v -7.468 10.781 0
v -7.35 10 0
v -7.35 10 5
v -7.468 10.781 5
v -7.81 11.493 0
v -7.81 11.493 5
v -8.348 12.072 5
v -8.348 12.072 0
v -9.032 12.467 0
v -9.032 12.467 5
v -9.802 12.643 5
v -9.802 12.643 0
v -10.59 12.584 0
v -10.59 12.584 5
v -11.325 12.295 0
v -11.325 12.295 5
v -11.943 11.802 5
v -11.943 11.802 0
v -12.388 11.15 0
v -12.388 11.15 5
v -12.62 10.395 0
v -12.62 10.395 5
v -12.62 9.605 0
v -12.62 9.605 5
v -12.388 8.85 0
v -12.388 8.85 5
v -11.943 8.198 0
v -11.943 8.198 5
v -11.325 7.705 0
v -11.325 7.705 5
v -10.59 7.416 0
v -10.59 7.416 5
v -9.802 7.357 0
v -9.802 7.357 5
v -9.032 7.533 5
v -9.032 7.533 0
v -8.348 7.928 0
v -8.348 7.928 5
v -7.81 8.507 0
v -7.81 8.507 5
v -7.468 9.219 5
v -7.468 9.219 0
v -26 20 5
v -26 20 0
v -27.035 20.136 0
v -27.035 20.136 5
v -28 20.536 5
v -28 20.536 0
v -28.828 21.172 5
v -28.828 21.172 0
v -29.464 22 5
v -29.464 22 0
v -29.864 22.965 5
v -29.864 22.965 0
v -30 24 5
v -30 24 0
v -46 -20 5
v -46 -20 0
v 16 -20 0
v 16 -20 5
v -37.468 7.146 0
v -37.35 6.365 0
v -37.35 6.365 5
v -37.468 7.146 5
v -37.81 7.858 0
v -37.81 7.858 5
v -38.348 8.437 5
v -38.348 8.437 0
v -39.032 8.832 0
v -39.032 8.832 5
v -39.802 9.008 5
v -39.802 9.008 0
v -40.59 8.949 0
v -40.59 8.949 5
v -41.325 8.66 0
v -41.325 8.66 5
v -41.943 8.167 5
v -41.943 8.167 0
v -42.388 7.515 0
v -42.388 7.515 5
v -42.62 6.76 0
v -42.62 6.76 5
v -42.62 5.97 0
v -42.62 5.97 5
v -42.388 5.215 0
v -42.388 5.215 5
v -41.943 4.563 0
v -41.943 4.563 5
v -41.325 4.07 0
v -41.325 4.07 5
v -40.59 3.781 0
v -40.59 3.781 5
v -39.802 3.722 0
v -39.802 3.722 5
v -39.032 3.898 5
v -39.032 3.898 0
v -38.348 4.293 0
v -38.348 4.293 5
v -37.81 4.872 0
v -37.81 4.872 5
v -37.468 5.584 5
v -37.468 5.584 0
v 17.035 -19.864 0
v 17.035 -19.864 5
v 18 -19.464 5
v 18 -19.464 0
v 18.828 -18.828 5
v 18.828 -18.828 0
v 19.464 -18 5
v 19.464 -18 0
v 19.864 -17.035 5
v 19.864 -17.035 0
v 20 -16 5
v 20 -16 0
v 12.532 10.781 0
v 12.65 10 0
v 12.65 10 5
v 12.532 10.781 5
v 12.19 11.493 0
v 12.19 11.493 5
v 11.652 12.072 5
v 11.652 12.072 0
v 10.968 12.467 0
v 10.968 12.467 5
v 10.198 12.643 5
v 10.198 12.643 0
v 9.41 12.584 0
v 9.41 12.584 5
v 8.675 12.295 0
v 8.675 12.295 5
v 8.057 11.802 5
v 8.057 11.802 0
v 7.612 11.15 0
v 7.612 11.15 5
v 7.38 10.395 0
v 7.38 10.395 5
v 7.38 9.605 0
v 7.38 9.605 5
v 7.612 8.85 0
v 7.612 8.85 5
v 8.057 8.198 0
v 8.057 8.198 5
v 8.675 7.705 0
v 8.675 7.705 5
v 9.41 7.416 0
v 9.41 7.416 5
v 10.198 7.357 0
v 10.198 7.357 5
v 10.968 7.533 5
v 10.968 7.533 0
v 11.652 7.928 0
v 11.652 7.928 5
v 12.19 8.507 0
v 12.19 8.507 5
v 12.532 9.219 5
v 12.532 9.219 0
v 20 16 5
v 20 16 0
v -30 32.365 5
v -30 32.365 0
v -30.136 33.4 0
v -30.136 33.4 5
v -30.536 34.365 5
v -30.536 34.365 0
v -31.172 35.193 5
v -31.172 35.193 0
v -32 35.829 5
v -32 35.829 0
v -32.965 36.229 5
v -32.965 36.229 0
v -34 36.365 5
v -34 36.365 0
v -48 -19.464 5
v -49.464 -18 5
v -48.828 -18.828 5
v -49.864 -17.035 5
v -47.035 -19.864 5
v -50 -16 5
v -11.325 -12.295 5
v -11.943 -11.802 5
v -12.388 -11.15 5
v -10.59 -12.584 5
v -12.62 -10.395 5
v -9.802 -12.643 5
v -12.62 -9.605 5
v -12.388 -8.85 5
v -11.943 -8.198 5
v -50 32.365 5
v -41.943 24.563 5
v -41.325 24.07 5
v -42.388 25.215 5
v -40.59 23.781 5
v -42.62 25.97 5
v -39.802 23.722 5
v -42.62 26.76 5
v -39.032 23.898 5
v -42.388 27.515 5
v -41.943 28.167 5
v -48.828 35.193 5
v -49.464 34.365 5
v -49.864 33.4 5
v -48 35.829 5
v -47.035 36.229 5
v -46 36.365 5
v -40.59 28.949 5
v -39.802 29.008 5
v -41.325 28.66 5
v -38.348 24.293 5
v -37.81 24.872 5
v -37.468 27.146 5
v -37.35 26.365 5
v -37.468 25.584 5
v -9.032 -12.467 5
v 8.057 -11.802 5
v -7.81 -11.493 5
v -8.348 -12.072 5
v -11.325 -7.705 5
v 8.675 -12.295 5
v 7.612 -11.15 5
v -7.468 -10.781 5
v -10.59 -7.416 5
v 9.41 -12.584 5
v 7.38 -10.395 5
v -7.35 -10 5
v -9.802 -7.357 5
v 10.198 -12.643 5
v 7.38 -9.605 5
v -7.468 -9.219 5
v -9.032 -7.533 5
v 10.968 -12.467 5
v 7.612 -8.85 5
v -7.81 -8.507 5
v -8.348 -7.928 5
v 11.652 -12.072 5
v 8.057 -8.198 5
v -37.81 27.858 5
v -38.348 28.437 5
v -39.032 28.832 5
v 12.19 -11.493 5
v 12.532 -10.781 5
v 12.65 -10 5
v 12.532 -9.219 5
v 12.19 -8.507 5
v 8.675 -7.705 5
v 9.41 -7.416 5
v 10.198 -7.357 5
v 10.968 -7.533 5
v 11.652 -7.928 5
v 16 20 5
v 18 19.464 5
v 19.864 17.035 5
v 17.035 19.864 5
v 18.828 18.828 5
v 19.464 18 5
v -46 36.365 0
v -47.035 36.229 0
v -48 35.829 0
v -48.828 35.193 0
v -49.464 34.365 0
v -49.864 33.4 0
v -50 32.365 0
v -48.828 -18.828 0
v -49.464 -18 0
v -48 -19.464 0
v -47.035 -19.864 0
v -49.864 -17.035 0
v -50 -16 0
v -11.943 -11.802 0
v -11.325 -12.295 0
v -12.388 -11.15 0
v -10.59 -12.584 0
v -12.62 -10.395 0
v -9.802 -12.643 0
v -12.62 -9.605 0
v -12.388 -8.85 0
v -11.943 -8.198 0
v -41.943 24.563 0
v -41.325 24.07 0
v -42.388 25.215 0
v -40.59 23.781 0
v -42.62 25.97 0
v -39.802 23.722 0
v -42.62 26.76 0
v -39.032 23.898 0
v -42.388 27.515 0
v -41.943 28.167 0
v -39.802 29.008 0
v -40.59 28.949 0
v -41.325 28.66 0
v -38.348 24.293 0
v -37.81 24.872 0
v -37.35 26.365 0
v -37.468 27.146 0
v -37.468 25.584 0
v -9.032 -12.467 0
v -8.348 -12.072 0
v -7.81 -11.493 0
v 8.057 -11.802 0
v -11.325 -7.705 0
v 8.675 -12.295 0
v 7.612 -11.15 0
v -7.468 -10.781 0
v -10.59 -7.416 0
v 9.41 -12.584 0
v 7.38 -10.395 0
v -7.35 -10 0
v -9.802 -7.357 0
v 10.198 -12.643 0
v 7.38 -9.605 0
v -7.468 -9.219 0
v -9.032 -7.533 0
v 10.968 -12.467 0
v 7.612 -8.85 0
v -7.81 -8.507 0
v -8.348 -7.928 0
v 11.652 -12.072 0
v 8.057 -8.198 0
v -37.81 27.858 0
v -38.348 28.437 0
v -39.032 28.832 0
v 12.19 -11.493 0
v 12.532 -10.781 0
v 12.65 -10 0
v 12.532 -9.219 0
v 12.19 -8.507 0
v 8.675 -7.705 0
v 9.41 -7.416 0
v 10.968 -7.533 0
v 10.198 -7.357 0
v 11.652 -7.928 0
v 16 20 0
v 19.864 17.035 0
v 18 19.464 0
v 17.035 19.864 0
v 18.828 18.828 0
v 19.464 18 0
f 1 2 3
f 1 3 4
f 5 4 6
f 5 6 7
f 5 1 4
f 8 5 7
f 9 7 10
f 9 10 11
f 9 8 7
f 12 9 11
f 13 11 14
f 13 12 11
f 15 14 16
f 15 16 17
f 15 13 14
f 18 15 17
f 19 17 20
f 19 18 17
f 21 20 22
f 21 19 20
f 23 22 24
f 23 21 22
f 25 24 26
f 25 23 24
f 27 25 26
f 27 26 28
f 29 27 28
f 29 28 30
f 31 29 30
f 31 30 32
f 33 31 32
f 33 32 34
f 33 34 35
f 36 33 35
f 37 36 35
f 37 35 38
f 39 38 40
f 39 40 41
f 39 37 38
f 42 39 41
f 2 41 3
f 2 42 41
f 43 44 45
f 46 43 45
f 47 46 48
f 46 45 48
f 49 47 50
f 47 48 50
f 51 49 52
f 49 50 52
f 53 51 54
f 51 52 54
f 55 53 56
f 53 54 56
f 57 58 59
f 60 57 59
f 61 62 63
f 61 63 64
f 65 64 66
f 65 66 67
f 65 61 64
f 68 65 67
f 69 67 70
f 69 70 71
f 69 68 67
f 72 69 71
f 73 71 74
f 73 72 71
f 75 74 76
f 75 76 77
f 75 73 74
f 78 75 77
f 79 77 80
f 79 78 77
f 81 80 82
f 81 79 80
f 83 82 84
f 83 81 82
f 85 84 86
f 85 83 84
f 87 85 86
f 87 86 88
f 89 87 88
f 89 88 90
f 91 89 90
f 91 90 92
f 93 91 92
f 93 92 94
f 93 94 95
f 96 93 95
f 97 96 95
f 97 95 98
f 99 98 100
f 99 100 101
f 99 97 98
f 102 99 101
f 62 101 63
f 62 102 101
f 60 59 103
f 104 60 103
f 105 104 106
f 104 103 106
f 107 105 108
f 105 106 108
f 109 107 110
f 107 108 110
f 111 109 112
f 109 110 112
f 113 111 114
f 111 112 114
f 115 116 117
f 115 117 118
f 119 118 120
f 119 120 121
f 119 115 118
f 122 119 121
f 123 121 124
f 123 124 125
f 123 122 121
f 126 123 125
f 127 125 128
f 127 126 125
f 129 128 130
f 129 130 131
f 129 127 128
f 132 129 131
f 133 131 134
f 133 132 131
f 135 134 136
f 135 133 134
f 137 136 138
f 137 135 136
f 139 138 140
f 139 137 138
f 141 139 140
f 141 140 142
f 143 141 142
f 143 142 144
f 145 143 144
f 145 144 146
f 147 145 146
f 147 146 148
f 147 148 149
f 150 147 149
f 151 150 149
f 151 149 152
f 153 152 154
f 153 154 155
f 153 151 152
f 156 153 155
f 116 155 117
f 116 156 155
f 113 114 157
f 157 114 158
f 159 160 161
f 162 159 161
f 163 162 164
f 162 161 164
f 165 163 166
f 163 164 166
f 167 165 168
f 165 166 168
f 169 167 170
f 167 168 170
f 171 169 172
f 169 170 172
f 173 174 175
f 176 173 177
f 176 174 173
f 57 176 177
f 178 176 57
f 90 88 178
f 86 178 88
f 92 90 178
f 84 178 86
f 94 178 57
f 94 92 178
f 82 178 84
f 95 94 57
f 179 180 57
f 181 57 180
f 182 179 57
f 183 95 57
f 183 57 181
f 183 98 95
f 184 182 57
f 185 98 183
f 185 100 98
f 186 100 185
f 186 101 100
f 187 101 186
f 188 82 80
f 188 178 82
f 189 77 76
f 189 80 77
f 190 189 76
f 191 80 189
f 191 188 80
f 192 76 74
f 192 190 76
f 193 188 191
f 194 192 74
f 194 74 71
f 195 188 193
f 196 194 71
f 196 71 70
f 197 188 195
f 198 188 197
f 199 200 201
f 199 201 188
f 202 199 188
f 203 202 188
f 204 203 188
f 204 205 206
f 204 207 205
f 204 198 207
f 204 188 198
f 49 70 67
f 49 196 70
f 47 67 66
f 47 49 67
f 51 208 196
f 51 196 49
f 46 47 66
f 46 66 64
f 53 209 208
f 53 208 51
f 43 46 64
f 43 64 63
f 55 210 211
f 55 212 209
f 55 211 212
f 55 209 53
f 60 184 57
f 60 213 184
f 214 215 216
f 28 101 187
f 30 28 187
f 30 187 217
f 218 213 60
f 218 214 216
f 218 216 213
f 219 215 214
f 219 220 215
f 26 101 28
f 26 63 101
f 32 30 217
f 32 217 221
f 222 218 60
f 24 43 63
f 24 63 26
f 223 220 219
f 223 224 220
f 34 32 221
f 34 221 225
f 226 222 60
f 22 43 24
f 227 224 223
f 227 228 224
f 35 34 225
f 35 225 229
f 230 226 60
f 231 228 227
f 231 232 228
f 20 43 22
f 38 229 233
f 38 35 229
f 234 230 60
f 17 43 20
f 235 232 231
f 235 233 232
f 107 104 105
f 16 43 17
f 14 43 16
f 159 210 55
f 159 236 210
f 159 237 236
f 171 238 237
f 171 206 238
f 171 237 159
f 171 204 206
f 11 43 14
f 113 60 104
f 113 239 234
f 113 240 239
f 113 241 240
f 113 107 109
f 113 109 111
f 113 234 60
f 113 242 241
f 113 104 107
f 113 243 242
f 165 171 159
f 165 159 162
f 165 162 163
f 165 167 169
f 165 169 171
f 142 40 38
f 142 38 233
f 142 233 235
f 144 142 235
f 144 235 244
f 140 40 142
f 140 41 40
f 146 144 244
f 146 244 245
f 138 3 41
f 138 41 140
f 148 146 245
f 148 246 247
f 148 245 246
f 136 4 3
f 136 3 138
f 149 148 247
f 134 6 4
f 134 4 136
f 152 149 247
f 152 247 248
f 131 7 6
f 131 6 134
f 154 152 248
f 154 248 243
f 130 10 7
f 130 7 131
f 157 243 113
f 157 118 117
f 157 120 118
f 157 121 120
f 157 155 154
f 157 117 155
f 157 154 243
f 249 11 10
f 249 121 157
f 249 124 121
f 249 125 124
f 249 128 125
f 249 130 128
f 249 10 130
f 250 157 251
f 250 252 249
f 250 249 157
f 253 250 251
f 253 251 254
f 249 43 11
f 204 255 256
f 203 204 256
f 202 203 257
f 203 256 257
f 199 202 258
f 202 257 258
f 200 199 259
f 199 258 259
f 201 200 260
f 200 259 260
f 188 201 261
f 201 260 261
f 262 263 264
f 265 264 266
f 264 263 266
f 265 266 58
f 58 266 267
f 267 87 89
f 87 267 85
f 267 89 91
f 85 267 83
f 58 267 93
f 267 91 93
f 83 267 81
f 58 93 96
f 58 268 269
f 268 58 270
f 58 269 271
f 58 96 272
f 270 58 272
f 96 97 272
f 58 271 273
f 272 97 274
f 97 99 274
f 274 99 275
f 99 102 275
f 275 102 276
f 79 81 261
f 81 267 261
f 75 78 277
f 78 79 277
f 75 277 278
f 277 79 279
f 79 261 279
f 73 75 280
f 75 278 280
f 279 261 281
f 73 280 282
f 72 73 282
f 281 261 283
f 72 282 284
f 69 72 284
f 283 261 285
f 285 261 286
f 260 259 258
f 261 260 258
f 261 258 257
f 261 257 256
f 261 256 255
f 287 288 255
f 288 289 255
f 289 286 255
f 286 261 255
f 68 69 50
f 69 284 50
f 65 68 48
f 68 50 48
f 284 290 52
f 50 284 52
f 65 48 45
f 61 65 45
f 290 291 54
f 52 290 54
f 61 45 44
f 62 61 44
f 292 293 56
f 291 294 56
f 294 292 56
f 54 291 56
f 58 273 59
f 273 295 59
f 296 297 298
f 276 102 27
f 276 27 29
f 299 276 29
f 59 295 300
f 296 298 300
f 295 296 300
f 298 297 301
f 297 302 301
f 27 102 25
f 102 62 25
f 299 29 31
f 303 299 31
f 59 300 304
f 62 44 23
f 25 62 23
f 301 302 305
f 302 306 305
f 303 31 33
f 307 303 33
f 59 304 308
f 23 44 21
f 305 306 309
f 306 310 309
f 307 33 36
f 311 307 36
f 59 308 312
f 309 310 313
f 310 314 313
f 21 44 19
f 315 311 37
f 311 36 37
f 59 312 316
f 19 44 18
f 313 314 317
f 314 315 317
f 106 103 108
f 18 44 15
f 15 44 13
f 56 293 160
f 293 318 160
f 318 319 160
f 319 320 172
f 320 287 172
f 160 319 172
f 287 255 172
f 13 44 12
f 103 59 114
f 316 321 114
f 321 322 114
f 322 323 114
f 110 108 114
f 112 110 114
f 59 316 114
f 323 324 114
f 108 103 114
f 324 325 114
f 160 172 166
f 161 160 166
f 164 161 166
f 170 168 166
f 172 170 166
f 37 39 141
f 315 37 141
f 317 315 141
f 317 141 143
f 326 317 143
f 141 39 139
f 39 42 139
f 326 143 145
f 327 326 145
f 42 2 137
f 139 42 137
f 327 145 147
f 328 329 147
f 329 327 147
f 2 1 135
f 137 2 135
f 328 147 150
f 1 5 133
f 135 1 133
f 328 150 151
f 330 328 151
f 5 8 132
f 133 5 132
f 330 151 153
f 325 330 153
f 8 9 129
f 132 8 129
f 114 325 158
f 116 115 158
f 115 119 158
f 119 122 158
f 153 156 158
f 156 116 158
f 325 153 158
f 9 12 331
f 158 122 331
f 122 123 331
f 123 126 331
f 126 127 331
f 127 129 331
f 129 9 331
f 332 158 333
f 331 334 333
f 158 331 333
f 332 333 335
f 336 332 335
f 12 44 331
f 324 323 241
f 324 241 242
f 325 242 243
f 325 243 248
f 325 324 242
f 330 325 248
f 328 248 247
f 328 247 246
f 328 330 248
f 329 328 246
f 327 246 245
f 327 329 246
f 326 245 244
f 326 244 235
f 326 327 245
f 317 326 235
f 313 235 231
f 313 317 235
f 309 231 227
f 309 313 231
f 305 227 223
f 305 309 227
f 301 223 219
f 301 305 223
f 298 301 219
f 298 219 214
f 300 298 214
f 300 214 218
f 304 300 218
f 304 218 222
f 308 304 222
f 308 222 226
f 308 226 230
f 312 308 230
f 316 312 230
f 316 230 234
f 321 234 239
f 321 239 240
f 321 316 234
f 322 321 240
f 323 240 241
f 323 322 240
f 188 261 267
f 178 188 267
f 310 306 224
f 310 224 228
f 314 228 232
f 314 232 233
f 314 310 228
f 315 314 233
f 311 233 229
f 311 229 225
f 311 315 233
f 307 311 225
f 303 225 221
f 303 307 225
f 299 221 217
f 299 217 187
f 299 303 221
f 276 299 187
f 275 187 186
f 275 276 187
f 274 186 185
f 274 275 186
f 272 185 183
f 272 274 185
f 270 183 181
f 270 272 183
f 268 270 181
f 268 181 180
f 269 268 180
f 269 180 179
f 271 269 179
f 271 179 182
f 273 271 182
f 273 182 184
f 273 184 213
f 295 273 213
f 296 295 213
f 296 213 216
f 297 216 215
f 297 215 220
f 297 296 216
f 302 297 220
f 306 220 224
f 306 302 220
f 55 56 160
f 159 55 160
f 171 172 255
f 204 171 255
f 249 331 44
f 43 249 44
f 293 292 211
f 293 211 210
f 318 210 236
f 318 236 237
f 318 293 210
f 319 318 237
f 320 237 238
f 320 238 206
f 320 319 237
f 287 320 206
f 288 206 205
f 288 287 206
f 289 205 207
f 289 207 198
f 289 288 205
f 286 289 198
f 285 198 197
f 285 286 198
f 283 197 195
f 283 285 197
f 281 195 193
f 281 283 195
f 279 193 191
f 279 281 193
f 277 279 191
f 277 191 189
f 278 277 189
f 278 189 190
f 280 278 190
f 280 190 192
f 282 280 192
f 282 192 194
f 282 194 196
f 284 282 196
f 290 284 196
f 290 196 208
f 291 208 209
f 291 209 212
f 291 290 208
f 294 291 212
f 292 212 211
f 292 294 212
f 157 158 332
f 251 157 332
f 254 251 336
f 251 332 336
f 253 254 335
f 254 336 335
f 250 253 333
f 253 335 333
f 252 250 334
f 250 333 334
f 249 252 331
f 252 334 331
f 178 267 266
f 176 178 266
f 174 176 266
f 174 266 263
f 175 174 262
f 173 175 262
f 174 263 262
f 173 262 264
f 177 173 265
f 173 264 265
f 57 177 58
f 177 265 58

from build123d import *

# Parameters (mm, degrees)
END_CAP_SKETCH_R        = 2.65
EXTRUDE_THICKNESS_DEPTH = 5


with BuildPart() as part:
    # End Cap Sketch → Extrude Thickness (new body)
    with BuildSketch(Plane.XY):
        with BuildLine():
            Line((-46, -20), (16, -20))
            ThreePointArc((16, -20), (18.828427125, -18.828427125), (20, -16))
            Line((20, -16), (20, 16))
            ThreePointArc((20, 16), (18.828427125, 18.828427125), (16, 20))
            Line((16, 20), (-26, 20))
            ThreePointArc((-26, 20), (-28.828427125, 21.171572875), (-30, 24))
            Line((-30, 24), (-30, 32.365))
            ThreePointArc((-30, 32.365), (-31.171572875, 35.193427125), (-34, 36.365))
            Line((-34, 36.365), (-46, 36.365))
            ThreePointArc((-46, 36.365), (-48.828427125, 35.193427125), (-50, 32.365))
            Line((-50, 32.365), (-50, -16))
            ThreePointArc((-50, -16), (-48.828427125, -18.828427125), (-46, -20))
        make_face()
        with Locations((-10, 10)):
            Circle(END_CAP_SKETCH_R, mode=Mode.SUBTRACT)
        with Locations((-10, -10)):
            Circle(END_CAP_SKETCH_R, mode=Mode.SUBTRACT)
        with Locations((10, 10)):
            Circle(END_CAP_SKETCH_R, mode=Mode.SUBTRACT)
        with Locations((10, -10)):
            Circle(END_CAP_SKETCH_R, mode=Mode.SUBTRACT)
        with Locations((-40, 26.365)):
            Circle(END_CAP_SKETCH_R, mode=Mode.SUBTRACT)
        with Locations((-40, 6.365)):
            Circle(END_CAP_SKETCH_R, mode=Mode.SUBTRACT)
    extrude(amount=EXTRUDE_THICKNESS_DEPTH)


solid = part.part
